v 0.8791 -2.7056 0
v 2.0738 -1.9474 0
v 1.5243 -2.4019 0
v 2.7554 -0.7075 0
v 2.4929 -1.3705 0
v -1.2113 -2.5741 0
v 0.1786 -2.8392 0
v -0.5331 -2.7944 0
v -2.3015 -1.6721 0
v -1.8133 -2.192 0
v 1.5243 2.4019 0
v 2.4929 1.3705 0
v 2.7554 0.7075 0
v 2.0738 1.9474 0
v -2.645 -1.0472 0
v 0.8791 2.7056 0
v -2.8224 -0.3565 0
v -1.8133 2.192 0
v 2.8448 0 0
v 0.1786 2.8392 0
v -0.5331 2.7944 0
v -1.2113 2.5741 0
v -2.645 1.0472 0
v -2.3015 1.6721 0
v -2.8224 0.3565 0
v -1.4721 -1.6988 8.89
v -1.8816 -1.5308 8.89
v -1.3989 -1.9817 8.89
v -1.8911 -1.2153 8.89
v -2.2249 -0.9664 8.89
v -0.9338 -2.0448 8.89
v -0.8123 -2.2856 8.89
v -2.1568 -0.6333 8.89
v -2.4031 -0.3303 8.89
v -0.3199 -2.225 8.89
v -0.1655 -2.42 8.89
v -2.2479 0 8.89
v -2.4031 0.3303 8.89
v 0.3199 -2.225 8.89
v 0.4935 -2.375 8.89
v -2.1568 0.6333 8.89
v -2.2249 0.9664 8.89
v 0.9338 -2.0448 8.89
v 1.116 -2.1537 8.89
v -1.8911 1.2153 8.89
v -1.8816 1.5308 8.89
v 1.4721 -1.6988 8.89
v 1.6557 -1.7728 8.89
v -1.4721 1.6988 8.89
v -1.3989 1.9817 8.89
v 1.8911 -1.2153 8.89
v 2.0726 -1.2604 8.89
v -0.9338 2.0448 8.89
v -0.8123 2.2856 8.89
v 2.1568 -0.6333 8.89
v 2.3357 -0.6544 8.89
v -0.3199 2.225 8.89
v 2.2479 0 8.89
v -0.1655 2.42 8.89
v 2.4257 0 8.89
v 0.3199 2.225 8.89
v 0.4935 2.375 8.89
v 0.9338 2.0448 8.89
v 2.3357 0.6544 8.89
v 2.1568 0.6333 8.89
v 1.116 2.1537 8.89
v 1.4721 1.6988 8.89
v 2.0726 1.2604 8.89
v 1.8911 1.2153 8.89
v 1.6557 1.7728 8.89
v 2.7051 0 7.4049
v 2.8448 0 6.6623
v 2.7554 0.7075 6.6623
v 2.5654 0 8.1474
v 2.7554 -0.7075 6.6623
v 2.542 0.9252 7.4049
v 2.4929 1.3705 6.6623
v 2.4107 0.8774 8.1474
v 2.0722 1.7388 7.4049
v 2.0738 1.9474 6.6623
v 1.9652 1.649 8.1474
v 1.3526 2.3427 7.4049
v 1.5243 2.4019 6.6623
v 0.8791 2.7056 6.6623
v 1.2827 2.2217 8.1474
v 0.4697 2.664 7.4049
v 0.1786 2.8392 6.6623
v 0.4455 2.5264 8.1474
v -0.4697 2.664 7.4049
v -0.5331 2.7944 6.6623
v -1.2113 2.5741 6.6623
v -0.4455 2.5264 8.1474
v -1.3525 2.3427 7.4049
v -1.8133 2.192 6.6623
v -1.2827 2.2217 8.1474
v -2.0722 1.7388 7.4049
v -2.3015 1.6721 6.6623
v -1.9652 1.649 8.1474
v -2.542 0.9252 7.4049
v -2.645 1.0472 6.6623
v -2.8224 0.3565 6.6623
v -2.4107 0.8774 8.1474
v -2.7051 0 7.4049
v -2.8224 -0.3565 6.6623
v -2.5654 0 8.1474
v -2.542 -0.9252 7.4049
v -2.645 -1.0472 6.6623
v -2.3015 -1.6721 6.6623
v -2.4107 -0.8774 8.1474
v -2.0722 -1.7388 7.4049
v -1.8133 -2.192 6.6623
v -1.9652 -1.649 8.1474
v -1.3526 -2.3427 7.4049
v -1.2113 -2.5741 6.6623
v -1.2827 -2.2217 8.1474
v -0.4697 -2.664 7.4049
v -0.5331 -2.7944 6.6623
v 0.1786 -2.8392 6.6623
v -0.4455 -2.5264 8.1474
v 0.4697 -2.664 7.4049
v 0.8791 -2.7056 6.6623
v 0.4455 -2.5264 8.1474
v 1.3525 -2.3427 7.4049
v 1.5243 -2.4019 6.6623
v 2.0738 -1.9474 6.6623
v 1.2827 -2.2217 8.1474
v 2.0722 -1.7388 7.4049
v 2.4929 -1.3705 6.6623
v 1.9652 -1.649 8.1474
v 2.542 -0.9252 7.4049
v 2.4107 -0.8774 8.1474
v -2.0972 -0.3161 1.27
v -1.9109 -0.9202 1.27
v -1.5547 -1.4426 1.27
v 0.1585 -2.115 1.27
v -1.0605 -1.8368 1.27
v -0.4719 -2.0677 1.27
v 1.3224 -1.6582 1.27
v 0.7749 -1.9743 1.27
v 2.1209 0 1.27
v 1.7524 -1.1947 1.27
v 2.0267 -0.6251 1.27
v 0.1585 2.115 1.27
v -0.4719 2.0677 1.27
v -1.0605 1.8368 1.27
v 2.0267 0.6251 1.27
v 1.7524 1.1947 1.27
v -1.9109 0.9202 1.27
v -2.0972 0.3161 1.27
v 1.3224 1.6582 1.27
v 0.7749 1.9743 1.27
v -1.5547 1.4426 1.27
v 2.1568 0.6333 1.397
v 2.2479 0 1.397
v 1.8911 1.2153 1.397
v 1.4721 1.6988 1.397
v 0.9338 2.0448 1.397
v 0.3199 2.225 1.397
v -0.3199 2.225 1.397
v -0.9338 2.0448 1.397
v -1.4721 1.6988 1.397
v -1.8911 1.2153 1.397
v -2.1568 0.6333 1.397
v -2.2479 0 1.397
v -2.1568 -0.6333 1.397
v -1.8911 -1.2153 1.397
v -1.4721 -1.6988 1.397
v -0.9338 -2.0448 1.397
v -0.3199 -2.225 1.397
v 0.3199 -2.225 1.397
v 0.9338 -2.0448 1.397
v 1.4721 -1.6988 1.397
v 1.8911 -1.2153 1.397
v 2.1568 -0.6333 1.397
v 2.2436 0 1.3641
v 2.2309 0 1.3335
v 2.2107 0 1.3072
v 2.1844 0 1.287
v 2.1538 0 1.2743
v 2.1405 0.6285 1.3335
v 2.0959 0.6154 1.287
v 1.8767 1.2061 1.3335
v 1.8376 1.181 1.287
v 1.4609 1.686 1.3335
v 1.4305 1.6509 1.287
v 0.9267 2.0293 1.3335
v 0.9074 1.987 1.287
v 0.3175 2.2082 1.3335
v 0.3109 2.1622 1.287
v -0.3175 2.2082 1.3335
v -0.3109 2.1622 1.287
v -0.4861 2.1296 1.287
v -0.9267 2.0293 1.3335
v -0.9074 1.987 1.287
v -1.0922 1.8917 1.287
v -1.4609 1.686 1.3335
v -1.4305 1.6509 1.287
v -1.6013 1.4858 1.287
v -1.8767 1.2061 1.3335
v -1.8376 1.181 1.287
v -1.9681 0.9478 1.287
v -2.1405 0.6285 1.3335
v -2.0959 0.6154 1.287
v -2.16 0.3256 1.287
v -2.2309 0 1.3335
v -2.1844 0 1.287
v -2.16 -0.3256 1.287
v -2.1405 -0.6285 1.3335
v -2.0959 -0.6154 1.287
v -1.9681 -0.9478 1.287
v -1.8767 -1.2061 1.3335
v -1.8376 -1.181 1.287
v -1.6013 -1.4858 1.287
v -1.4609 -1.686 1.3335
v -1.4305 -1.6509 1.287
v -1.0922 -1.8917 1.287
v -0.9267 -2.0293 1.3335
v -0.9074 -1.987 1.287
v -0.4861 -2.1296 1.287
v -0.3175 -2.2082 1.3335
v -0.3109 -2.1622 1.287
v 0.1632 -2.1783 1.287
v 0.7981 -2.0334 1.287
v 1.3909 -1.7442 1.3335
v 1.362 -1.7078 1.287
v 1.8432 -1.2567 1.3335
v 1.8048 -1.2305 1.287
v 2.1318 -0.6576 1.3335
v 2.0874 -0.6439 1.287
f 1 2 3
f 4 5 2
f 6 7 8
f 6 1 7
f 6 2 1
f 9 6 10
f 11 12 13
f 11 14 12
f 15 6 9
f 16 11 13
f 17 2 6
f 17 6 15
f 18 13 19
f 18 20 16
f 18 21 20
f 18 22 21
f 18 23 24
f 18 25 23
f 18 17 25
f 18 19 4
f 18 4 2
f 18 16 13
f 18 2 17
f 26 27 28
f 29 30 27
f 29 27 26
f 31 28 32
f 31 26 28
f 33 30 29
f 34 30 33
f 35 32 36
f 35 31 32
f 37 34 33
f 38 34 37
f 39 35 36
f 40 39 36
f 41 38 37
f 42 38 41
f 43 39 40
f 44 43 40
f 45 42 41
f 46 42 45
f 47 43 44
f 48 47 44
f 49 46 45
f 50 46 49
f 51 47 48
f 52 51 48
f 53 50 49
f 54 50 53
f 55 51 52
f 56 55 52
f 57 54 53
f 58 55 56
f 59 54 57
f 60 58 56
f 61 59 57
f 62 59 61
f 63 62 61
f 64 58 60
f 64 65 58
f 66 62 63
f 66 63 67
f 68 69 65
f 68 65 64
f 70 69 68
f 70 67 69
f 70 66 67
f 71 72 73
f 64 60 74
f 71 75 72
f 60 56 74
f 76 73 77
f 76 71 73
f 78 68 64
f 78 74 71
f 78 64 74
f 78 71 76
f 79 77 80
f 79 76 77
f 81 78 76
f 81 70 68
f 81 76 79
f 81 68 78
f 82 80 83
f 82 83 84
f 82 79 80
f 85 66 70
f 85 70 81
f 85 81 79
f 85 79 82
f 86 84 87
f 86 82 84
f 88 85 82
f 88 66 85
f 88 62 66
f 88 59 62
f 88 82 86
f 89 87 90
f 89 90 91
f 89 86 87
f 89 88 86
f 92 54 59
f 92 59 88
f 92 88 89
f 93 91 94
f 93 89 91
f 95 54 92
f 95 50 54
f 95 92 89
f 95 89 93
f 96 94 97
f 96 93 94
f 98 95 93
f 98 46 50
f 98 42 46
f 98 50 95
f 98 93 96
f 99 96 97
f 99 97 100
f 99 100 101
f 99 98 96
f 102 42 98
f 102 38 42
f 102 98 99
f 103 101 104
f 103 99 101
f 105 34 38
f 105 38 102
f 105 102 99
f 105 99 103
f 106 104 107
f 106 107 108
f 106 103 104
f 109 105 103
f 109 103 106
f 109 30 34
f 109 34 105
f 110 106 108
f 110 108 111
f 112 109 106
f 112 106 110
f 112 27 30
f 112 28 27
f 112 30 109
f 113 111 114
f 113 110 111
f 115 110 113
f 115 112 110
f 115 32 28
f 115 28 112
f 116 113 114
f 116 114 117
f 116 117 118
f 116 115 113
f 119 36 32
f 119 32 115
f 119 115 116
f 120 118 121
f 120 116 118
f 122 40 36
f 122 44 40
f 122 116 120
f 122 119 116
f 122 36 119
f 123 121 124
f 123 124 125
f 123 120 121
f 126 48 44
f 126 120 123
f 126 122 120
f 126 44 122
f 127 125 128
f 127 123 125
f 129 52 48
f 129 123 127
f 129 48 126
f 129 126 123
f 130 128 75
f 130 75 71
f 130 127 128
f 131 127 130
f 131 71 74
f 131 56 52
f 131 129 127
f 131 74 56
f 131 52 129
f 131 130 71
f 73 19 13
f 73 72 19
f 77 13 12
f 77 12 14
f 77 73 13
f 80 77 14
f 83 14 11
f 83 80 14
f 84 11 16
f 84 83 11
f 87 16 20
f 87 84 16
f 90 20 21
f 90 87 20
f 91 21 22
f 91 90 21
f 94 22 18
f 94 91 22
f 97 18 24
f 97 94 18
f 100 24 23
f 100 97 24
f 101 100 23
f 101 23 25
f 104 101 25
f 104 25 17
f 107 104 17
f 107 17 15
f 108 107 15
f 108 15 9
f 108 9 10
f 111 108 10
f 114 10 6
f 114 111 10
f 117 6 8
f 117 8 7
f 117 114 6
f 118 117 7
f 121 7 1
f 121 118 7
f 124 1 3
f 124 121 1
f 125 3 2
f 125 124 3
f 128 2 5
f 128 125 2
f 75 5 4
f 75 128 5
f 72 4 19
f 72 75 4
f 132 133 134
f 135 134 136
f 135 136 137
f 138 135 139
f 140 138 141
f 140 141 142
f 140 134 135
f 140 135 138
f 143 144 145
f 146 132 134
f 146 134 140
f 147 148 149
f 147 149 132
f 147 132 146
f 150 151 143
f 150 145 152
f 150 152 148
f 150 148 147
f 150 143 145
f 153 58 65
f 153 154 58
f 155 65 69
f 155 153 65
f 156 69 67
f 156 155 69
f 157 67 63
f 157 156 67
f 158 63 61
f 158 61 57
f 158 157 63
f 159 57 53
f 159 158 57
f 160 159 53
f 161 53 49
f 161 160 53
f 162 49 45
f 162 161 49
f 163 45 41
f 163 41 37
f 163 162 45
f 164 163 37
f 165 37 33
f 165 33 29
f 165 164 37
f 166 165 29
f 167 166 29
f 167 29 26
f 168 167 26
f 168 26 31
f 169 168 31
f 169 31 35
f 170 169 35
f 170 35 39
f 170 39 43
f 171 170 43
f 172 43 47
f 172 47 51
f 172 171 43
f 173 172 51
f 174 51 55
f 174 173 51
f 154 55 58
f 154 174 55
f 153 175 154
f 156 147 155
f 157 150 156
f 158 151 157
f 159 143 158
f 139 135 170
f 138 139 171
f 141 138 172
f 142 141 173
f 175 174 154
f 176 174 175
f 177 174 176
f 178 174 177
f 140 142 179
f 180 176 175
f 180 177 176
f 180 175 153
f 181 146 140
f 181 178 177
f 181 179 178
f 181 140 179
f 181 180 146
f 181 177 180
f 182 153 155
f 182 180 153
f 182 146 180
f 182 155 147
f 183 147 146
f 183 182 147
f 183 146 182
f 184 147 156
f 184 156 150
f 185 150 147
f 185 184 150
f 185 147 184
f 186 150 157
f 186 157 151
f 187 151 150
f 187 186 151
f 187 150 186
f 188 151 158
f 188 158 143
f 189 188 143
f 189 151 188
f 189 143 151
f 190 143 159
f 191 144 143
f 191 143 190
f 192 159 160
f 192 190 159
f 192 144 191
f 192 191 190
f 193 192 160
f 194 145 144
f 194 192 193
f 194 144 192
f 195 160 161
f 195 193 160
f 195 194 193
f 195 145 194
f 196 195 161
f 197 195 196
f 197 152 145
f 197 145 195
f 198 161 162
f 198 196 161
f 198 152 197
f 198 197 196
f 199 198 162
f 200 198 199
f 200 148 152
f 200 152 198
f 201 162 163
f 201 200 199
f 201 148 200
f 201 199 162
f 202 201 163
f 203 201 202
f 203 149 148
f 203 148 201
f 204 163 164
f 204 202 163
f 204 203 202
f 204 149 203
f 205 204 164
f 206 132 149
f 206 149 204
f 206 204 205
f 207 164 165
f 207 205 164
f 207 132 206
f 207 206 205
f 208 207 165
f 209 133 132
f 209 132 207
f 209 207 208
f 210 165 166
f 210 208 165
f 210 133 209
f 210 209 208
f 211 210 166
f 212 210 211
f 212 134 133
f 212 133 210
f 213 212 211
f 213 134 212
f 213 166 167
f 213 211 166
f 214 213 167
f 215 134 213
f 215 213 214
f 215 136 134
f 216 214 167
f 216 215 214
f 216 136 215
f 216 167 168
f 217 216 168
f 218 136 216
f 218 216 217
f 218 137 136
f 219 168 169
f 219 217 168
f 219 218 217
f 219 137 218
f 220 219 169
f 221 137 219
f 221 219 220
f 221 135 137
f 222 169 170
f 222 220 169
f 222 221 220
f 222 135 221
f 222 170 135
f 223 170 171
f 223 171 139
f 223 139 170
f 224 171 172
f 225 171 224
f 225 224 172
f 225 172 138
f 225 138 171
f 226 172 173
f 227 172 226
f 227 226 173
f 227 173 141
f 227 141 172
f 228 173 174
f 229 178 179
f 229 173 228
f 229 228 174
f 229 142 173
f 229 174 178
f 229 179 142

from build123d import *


with BuildPart() as f1:
    # F0 (on Front) → F1 (revolve)
    with BuildSketch(Plane.XZ):
        with BuildLine():
            Line((2.4257, 8.89), (2.2479, 8.89))
            Line((2.2479, 8.89), (2.2479, 1.397))
            ThreePointArc((2.2479, 1.397), (2.210703, 1.307197), (2.1209, 1.27))
            Line((2.1209, 1.27), (0, 1.27))
            Line((0, 1.27), (0, 0))
            Line((0, 0), (2.8448, 0))
            Line((2.8448, 0), (2.8448, 6.662339))
            Line((2.8448, 6.662339), (2.4257, 8.89))
        make_face()
    revolve(axis=Axis((0, 0, 7.564645), (0, 0, 1)))


solid = f1.part
